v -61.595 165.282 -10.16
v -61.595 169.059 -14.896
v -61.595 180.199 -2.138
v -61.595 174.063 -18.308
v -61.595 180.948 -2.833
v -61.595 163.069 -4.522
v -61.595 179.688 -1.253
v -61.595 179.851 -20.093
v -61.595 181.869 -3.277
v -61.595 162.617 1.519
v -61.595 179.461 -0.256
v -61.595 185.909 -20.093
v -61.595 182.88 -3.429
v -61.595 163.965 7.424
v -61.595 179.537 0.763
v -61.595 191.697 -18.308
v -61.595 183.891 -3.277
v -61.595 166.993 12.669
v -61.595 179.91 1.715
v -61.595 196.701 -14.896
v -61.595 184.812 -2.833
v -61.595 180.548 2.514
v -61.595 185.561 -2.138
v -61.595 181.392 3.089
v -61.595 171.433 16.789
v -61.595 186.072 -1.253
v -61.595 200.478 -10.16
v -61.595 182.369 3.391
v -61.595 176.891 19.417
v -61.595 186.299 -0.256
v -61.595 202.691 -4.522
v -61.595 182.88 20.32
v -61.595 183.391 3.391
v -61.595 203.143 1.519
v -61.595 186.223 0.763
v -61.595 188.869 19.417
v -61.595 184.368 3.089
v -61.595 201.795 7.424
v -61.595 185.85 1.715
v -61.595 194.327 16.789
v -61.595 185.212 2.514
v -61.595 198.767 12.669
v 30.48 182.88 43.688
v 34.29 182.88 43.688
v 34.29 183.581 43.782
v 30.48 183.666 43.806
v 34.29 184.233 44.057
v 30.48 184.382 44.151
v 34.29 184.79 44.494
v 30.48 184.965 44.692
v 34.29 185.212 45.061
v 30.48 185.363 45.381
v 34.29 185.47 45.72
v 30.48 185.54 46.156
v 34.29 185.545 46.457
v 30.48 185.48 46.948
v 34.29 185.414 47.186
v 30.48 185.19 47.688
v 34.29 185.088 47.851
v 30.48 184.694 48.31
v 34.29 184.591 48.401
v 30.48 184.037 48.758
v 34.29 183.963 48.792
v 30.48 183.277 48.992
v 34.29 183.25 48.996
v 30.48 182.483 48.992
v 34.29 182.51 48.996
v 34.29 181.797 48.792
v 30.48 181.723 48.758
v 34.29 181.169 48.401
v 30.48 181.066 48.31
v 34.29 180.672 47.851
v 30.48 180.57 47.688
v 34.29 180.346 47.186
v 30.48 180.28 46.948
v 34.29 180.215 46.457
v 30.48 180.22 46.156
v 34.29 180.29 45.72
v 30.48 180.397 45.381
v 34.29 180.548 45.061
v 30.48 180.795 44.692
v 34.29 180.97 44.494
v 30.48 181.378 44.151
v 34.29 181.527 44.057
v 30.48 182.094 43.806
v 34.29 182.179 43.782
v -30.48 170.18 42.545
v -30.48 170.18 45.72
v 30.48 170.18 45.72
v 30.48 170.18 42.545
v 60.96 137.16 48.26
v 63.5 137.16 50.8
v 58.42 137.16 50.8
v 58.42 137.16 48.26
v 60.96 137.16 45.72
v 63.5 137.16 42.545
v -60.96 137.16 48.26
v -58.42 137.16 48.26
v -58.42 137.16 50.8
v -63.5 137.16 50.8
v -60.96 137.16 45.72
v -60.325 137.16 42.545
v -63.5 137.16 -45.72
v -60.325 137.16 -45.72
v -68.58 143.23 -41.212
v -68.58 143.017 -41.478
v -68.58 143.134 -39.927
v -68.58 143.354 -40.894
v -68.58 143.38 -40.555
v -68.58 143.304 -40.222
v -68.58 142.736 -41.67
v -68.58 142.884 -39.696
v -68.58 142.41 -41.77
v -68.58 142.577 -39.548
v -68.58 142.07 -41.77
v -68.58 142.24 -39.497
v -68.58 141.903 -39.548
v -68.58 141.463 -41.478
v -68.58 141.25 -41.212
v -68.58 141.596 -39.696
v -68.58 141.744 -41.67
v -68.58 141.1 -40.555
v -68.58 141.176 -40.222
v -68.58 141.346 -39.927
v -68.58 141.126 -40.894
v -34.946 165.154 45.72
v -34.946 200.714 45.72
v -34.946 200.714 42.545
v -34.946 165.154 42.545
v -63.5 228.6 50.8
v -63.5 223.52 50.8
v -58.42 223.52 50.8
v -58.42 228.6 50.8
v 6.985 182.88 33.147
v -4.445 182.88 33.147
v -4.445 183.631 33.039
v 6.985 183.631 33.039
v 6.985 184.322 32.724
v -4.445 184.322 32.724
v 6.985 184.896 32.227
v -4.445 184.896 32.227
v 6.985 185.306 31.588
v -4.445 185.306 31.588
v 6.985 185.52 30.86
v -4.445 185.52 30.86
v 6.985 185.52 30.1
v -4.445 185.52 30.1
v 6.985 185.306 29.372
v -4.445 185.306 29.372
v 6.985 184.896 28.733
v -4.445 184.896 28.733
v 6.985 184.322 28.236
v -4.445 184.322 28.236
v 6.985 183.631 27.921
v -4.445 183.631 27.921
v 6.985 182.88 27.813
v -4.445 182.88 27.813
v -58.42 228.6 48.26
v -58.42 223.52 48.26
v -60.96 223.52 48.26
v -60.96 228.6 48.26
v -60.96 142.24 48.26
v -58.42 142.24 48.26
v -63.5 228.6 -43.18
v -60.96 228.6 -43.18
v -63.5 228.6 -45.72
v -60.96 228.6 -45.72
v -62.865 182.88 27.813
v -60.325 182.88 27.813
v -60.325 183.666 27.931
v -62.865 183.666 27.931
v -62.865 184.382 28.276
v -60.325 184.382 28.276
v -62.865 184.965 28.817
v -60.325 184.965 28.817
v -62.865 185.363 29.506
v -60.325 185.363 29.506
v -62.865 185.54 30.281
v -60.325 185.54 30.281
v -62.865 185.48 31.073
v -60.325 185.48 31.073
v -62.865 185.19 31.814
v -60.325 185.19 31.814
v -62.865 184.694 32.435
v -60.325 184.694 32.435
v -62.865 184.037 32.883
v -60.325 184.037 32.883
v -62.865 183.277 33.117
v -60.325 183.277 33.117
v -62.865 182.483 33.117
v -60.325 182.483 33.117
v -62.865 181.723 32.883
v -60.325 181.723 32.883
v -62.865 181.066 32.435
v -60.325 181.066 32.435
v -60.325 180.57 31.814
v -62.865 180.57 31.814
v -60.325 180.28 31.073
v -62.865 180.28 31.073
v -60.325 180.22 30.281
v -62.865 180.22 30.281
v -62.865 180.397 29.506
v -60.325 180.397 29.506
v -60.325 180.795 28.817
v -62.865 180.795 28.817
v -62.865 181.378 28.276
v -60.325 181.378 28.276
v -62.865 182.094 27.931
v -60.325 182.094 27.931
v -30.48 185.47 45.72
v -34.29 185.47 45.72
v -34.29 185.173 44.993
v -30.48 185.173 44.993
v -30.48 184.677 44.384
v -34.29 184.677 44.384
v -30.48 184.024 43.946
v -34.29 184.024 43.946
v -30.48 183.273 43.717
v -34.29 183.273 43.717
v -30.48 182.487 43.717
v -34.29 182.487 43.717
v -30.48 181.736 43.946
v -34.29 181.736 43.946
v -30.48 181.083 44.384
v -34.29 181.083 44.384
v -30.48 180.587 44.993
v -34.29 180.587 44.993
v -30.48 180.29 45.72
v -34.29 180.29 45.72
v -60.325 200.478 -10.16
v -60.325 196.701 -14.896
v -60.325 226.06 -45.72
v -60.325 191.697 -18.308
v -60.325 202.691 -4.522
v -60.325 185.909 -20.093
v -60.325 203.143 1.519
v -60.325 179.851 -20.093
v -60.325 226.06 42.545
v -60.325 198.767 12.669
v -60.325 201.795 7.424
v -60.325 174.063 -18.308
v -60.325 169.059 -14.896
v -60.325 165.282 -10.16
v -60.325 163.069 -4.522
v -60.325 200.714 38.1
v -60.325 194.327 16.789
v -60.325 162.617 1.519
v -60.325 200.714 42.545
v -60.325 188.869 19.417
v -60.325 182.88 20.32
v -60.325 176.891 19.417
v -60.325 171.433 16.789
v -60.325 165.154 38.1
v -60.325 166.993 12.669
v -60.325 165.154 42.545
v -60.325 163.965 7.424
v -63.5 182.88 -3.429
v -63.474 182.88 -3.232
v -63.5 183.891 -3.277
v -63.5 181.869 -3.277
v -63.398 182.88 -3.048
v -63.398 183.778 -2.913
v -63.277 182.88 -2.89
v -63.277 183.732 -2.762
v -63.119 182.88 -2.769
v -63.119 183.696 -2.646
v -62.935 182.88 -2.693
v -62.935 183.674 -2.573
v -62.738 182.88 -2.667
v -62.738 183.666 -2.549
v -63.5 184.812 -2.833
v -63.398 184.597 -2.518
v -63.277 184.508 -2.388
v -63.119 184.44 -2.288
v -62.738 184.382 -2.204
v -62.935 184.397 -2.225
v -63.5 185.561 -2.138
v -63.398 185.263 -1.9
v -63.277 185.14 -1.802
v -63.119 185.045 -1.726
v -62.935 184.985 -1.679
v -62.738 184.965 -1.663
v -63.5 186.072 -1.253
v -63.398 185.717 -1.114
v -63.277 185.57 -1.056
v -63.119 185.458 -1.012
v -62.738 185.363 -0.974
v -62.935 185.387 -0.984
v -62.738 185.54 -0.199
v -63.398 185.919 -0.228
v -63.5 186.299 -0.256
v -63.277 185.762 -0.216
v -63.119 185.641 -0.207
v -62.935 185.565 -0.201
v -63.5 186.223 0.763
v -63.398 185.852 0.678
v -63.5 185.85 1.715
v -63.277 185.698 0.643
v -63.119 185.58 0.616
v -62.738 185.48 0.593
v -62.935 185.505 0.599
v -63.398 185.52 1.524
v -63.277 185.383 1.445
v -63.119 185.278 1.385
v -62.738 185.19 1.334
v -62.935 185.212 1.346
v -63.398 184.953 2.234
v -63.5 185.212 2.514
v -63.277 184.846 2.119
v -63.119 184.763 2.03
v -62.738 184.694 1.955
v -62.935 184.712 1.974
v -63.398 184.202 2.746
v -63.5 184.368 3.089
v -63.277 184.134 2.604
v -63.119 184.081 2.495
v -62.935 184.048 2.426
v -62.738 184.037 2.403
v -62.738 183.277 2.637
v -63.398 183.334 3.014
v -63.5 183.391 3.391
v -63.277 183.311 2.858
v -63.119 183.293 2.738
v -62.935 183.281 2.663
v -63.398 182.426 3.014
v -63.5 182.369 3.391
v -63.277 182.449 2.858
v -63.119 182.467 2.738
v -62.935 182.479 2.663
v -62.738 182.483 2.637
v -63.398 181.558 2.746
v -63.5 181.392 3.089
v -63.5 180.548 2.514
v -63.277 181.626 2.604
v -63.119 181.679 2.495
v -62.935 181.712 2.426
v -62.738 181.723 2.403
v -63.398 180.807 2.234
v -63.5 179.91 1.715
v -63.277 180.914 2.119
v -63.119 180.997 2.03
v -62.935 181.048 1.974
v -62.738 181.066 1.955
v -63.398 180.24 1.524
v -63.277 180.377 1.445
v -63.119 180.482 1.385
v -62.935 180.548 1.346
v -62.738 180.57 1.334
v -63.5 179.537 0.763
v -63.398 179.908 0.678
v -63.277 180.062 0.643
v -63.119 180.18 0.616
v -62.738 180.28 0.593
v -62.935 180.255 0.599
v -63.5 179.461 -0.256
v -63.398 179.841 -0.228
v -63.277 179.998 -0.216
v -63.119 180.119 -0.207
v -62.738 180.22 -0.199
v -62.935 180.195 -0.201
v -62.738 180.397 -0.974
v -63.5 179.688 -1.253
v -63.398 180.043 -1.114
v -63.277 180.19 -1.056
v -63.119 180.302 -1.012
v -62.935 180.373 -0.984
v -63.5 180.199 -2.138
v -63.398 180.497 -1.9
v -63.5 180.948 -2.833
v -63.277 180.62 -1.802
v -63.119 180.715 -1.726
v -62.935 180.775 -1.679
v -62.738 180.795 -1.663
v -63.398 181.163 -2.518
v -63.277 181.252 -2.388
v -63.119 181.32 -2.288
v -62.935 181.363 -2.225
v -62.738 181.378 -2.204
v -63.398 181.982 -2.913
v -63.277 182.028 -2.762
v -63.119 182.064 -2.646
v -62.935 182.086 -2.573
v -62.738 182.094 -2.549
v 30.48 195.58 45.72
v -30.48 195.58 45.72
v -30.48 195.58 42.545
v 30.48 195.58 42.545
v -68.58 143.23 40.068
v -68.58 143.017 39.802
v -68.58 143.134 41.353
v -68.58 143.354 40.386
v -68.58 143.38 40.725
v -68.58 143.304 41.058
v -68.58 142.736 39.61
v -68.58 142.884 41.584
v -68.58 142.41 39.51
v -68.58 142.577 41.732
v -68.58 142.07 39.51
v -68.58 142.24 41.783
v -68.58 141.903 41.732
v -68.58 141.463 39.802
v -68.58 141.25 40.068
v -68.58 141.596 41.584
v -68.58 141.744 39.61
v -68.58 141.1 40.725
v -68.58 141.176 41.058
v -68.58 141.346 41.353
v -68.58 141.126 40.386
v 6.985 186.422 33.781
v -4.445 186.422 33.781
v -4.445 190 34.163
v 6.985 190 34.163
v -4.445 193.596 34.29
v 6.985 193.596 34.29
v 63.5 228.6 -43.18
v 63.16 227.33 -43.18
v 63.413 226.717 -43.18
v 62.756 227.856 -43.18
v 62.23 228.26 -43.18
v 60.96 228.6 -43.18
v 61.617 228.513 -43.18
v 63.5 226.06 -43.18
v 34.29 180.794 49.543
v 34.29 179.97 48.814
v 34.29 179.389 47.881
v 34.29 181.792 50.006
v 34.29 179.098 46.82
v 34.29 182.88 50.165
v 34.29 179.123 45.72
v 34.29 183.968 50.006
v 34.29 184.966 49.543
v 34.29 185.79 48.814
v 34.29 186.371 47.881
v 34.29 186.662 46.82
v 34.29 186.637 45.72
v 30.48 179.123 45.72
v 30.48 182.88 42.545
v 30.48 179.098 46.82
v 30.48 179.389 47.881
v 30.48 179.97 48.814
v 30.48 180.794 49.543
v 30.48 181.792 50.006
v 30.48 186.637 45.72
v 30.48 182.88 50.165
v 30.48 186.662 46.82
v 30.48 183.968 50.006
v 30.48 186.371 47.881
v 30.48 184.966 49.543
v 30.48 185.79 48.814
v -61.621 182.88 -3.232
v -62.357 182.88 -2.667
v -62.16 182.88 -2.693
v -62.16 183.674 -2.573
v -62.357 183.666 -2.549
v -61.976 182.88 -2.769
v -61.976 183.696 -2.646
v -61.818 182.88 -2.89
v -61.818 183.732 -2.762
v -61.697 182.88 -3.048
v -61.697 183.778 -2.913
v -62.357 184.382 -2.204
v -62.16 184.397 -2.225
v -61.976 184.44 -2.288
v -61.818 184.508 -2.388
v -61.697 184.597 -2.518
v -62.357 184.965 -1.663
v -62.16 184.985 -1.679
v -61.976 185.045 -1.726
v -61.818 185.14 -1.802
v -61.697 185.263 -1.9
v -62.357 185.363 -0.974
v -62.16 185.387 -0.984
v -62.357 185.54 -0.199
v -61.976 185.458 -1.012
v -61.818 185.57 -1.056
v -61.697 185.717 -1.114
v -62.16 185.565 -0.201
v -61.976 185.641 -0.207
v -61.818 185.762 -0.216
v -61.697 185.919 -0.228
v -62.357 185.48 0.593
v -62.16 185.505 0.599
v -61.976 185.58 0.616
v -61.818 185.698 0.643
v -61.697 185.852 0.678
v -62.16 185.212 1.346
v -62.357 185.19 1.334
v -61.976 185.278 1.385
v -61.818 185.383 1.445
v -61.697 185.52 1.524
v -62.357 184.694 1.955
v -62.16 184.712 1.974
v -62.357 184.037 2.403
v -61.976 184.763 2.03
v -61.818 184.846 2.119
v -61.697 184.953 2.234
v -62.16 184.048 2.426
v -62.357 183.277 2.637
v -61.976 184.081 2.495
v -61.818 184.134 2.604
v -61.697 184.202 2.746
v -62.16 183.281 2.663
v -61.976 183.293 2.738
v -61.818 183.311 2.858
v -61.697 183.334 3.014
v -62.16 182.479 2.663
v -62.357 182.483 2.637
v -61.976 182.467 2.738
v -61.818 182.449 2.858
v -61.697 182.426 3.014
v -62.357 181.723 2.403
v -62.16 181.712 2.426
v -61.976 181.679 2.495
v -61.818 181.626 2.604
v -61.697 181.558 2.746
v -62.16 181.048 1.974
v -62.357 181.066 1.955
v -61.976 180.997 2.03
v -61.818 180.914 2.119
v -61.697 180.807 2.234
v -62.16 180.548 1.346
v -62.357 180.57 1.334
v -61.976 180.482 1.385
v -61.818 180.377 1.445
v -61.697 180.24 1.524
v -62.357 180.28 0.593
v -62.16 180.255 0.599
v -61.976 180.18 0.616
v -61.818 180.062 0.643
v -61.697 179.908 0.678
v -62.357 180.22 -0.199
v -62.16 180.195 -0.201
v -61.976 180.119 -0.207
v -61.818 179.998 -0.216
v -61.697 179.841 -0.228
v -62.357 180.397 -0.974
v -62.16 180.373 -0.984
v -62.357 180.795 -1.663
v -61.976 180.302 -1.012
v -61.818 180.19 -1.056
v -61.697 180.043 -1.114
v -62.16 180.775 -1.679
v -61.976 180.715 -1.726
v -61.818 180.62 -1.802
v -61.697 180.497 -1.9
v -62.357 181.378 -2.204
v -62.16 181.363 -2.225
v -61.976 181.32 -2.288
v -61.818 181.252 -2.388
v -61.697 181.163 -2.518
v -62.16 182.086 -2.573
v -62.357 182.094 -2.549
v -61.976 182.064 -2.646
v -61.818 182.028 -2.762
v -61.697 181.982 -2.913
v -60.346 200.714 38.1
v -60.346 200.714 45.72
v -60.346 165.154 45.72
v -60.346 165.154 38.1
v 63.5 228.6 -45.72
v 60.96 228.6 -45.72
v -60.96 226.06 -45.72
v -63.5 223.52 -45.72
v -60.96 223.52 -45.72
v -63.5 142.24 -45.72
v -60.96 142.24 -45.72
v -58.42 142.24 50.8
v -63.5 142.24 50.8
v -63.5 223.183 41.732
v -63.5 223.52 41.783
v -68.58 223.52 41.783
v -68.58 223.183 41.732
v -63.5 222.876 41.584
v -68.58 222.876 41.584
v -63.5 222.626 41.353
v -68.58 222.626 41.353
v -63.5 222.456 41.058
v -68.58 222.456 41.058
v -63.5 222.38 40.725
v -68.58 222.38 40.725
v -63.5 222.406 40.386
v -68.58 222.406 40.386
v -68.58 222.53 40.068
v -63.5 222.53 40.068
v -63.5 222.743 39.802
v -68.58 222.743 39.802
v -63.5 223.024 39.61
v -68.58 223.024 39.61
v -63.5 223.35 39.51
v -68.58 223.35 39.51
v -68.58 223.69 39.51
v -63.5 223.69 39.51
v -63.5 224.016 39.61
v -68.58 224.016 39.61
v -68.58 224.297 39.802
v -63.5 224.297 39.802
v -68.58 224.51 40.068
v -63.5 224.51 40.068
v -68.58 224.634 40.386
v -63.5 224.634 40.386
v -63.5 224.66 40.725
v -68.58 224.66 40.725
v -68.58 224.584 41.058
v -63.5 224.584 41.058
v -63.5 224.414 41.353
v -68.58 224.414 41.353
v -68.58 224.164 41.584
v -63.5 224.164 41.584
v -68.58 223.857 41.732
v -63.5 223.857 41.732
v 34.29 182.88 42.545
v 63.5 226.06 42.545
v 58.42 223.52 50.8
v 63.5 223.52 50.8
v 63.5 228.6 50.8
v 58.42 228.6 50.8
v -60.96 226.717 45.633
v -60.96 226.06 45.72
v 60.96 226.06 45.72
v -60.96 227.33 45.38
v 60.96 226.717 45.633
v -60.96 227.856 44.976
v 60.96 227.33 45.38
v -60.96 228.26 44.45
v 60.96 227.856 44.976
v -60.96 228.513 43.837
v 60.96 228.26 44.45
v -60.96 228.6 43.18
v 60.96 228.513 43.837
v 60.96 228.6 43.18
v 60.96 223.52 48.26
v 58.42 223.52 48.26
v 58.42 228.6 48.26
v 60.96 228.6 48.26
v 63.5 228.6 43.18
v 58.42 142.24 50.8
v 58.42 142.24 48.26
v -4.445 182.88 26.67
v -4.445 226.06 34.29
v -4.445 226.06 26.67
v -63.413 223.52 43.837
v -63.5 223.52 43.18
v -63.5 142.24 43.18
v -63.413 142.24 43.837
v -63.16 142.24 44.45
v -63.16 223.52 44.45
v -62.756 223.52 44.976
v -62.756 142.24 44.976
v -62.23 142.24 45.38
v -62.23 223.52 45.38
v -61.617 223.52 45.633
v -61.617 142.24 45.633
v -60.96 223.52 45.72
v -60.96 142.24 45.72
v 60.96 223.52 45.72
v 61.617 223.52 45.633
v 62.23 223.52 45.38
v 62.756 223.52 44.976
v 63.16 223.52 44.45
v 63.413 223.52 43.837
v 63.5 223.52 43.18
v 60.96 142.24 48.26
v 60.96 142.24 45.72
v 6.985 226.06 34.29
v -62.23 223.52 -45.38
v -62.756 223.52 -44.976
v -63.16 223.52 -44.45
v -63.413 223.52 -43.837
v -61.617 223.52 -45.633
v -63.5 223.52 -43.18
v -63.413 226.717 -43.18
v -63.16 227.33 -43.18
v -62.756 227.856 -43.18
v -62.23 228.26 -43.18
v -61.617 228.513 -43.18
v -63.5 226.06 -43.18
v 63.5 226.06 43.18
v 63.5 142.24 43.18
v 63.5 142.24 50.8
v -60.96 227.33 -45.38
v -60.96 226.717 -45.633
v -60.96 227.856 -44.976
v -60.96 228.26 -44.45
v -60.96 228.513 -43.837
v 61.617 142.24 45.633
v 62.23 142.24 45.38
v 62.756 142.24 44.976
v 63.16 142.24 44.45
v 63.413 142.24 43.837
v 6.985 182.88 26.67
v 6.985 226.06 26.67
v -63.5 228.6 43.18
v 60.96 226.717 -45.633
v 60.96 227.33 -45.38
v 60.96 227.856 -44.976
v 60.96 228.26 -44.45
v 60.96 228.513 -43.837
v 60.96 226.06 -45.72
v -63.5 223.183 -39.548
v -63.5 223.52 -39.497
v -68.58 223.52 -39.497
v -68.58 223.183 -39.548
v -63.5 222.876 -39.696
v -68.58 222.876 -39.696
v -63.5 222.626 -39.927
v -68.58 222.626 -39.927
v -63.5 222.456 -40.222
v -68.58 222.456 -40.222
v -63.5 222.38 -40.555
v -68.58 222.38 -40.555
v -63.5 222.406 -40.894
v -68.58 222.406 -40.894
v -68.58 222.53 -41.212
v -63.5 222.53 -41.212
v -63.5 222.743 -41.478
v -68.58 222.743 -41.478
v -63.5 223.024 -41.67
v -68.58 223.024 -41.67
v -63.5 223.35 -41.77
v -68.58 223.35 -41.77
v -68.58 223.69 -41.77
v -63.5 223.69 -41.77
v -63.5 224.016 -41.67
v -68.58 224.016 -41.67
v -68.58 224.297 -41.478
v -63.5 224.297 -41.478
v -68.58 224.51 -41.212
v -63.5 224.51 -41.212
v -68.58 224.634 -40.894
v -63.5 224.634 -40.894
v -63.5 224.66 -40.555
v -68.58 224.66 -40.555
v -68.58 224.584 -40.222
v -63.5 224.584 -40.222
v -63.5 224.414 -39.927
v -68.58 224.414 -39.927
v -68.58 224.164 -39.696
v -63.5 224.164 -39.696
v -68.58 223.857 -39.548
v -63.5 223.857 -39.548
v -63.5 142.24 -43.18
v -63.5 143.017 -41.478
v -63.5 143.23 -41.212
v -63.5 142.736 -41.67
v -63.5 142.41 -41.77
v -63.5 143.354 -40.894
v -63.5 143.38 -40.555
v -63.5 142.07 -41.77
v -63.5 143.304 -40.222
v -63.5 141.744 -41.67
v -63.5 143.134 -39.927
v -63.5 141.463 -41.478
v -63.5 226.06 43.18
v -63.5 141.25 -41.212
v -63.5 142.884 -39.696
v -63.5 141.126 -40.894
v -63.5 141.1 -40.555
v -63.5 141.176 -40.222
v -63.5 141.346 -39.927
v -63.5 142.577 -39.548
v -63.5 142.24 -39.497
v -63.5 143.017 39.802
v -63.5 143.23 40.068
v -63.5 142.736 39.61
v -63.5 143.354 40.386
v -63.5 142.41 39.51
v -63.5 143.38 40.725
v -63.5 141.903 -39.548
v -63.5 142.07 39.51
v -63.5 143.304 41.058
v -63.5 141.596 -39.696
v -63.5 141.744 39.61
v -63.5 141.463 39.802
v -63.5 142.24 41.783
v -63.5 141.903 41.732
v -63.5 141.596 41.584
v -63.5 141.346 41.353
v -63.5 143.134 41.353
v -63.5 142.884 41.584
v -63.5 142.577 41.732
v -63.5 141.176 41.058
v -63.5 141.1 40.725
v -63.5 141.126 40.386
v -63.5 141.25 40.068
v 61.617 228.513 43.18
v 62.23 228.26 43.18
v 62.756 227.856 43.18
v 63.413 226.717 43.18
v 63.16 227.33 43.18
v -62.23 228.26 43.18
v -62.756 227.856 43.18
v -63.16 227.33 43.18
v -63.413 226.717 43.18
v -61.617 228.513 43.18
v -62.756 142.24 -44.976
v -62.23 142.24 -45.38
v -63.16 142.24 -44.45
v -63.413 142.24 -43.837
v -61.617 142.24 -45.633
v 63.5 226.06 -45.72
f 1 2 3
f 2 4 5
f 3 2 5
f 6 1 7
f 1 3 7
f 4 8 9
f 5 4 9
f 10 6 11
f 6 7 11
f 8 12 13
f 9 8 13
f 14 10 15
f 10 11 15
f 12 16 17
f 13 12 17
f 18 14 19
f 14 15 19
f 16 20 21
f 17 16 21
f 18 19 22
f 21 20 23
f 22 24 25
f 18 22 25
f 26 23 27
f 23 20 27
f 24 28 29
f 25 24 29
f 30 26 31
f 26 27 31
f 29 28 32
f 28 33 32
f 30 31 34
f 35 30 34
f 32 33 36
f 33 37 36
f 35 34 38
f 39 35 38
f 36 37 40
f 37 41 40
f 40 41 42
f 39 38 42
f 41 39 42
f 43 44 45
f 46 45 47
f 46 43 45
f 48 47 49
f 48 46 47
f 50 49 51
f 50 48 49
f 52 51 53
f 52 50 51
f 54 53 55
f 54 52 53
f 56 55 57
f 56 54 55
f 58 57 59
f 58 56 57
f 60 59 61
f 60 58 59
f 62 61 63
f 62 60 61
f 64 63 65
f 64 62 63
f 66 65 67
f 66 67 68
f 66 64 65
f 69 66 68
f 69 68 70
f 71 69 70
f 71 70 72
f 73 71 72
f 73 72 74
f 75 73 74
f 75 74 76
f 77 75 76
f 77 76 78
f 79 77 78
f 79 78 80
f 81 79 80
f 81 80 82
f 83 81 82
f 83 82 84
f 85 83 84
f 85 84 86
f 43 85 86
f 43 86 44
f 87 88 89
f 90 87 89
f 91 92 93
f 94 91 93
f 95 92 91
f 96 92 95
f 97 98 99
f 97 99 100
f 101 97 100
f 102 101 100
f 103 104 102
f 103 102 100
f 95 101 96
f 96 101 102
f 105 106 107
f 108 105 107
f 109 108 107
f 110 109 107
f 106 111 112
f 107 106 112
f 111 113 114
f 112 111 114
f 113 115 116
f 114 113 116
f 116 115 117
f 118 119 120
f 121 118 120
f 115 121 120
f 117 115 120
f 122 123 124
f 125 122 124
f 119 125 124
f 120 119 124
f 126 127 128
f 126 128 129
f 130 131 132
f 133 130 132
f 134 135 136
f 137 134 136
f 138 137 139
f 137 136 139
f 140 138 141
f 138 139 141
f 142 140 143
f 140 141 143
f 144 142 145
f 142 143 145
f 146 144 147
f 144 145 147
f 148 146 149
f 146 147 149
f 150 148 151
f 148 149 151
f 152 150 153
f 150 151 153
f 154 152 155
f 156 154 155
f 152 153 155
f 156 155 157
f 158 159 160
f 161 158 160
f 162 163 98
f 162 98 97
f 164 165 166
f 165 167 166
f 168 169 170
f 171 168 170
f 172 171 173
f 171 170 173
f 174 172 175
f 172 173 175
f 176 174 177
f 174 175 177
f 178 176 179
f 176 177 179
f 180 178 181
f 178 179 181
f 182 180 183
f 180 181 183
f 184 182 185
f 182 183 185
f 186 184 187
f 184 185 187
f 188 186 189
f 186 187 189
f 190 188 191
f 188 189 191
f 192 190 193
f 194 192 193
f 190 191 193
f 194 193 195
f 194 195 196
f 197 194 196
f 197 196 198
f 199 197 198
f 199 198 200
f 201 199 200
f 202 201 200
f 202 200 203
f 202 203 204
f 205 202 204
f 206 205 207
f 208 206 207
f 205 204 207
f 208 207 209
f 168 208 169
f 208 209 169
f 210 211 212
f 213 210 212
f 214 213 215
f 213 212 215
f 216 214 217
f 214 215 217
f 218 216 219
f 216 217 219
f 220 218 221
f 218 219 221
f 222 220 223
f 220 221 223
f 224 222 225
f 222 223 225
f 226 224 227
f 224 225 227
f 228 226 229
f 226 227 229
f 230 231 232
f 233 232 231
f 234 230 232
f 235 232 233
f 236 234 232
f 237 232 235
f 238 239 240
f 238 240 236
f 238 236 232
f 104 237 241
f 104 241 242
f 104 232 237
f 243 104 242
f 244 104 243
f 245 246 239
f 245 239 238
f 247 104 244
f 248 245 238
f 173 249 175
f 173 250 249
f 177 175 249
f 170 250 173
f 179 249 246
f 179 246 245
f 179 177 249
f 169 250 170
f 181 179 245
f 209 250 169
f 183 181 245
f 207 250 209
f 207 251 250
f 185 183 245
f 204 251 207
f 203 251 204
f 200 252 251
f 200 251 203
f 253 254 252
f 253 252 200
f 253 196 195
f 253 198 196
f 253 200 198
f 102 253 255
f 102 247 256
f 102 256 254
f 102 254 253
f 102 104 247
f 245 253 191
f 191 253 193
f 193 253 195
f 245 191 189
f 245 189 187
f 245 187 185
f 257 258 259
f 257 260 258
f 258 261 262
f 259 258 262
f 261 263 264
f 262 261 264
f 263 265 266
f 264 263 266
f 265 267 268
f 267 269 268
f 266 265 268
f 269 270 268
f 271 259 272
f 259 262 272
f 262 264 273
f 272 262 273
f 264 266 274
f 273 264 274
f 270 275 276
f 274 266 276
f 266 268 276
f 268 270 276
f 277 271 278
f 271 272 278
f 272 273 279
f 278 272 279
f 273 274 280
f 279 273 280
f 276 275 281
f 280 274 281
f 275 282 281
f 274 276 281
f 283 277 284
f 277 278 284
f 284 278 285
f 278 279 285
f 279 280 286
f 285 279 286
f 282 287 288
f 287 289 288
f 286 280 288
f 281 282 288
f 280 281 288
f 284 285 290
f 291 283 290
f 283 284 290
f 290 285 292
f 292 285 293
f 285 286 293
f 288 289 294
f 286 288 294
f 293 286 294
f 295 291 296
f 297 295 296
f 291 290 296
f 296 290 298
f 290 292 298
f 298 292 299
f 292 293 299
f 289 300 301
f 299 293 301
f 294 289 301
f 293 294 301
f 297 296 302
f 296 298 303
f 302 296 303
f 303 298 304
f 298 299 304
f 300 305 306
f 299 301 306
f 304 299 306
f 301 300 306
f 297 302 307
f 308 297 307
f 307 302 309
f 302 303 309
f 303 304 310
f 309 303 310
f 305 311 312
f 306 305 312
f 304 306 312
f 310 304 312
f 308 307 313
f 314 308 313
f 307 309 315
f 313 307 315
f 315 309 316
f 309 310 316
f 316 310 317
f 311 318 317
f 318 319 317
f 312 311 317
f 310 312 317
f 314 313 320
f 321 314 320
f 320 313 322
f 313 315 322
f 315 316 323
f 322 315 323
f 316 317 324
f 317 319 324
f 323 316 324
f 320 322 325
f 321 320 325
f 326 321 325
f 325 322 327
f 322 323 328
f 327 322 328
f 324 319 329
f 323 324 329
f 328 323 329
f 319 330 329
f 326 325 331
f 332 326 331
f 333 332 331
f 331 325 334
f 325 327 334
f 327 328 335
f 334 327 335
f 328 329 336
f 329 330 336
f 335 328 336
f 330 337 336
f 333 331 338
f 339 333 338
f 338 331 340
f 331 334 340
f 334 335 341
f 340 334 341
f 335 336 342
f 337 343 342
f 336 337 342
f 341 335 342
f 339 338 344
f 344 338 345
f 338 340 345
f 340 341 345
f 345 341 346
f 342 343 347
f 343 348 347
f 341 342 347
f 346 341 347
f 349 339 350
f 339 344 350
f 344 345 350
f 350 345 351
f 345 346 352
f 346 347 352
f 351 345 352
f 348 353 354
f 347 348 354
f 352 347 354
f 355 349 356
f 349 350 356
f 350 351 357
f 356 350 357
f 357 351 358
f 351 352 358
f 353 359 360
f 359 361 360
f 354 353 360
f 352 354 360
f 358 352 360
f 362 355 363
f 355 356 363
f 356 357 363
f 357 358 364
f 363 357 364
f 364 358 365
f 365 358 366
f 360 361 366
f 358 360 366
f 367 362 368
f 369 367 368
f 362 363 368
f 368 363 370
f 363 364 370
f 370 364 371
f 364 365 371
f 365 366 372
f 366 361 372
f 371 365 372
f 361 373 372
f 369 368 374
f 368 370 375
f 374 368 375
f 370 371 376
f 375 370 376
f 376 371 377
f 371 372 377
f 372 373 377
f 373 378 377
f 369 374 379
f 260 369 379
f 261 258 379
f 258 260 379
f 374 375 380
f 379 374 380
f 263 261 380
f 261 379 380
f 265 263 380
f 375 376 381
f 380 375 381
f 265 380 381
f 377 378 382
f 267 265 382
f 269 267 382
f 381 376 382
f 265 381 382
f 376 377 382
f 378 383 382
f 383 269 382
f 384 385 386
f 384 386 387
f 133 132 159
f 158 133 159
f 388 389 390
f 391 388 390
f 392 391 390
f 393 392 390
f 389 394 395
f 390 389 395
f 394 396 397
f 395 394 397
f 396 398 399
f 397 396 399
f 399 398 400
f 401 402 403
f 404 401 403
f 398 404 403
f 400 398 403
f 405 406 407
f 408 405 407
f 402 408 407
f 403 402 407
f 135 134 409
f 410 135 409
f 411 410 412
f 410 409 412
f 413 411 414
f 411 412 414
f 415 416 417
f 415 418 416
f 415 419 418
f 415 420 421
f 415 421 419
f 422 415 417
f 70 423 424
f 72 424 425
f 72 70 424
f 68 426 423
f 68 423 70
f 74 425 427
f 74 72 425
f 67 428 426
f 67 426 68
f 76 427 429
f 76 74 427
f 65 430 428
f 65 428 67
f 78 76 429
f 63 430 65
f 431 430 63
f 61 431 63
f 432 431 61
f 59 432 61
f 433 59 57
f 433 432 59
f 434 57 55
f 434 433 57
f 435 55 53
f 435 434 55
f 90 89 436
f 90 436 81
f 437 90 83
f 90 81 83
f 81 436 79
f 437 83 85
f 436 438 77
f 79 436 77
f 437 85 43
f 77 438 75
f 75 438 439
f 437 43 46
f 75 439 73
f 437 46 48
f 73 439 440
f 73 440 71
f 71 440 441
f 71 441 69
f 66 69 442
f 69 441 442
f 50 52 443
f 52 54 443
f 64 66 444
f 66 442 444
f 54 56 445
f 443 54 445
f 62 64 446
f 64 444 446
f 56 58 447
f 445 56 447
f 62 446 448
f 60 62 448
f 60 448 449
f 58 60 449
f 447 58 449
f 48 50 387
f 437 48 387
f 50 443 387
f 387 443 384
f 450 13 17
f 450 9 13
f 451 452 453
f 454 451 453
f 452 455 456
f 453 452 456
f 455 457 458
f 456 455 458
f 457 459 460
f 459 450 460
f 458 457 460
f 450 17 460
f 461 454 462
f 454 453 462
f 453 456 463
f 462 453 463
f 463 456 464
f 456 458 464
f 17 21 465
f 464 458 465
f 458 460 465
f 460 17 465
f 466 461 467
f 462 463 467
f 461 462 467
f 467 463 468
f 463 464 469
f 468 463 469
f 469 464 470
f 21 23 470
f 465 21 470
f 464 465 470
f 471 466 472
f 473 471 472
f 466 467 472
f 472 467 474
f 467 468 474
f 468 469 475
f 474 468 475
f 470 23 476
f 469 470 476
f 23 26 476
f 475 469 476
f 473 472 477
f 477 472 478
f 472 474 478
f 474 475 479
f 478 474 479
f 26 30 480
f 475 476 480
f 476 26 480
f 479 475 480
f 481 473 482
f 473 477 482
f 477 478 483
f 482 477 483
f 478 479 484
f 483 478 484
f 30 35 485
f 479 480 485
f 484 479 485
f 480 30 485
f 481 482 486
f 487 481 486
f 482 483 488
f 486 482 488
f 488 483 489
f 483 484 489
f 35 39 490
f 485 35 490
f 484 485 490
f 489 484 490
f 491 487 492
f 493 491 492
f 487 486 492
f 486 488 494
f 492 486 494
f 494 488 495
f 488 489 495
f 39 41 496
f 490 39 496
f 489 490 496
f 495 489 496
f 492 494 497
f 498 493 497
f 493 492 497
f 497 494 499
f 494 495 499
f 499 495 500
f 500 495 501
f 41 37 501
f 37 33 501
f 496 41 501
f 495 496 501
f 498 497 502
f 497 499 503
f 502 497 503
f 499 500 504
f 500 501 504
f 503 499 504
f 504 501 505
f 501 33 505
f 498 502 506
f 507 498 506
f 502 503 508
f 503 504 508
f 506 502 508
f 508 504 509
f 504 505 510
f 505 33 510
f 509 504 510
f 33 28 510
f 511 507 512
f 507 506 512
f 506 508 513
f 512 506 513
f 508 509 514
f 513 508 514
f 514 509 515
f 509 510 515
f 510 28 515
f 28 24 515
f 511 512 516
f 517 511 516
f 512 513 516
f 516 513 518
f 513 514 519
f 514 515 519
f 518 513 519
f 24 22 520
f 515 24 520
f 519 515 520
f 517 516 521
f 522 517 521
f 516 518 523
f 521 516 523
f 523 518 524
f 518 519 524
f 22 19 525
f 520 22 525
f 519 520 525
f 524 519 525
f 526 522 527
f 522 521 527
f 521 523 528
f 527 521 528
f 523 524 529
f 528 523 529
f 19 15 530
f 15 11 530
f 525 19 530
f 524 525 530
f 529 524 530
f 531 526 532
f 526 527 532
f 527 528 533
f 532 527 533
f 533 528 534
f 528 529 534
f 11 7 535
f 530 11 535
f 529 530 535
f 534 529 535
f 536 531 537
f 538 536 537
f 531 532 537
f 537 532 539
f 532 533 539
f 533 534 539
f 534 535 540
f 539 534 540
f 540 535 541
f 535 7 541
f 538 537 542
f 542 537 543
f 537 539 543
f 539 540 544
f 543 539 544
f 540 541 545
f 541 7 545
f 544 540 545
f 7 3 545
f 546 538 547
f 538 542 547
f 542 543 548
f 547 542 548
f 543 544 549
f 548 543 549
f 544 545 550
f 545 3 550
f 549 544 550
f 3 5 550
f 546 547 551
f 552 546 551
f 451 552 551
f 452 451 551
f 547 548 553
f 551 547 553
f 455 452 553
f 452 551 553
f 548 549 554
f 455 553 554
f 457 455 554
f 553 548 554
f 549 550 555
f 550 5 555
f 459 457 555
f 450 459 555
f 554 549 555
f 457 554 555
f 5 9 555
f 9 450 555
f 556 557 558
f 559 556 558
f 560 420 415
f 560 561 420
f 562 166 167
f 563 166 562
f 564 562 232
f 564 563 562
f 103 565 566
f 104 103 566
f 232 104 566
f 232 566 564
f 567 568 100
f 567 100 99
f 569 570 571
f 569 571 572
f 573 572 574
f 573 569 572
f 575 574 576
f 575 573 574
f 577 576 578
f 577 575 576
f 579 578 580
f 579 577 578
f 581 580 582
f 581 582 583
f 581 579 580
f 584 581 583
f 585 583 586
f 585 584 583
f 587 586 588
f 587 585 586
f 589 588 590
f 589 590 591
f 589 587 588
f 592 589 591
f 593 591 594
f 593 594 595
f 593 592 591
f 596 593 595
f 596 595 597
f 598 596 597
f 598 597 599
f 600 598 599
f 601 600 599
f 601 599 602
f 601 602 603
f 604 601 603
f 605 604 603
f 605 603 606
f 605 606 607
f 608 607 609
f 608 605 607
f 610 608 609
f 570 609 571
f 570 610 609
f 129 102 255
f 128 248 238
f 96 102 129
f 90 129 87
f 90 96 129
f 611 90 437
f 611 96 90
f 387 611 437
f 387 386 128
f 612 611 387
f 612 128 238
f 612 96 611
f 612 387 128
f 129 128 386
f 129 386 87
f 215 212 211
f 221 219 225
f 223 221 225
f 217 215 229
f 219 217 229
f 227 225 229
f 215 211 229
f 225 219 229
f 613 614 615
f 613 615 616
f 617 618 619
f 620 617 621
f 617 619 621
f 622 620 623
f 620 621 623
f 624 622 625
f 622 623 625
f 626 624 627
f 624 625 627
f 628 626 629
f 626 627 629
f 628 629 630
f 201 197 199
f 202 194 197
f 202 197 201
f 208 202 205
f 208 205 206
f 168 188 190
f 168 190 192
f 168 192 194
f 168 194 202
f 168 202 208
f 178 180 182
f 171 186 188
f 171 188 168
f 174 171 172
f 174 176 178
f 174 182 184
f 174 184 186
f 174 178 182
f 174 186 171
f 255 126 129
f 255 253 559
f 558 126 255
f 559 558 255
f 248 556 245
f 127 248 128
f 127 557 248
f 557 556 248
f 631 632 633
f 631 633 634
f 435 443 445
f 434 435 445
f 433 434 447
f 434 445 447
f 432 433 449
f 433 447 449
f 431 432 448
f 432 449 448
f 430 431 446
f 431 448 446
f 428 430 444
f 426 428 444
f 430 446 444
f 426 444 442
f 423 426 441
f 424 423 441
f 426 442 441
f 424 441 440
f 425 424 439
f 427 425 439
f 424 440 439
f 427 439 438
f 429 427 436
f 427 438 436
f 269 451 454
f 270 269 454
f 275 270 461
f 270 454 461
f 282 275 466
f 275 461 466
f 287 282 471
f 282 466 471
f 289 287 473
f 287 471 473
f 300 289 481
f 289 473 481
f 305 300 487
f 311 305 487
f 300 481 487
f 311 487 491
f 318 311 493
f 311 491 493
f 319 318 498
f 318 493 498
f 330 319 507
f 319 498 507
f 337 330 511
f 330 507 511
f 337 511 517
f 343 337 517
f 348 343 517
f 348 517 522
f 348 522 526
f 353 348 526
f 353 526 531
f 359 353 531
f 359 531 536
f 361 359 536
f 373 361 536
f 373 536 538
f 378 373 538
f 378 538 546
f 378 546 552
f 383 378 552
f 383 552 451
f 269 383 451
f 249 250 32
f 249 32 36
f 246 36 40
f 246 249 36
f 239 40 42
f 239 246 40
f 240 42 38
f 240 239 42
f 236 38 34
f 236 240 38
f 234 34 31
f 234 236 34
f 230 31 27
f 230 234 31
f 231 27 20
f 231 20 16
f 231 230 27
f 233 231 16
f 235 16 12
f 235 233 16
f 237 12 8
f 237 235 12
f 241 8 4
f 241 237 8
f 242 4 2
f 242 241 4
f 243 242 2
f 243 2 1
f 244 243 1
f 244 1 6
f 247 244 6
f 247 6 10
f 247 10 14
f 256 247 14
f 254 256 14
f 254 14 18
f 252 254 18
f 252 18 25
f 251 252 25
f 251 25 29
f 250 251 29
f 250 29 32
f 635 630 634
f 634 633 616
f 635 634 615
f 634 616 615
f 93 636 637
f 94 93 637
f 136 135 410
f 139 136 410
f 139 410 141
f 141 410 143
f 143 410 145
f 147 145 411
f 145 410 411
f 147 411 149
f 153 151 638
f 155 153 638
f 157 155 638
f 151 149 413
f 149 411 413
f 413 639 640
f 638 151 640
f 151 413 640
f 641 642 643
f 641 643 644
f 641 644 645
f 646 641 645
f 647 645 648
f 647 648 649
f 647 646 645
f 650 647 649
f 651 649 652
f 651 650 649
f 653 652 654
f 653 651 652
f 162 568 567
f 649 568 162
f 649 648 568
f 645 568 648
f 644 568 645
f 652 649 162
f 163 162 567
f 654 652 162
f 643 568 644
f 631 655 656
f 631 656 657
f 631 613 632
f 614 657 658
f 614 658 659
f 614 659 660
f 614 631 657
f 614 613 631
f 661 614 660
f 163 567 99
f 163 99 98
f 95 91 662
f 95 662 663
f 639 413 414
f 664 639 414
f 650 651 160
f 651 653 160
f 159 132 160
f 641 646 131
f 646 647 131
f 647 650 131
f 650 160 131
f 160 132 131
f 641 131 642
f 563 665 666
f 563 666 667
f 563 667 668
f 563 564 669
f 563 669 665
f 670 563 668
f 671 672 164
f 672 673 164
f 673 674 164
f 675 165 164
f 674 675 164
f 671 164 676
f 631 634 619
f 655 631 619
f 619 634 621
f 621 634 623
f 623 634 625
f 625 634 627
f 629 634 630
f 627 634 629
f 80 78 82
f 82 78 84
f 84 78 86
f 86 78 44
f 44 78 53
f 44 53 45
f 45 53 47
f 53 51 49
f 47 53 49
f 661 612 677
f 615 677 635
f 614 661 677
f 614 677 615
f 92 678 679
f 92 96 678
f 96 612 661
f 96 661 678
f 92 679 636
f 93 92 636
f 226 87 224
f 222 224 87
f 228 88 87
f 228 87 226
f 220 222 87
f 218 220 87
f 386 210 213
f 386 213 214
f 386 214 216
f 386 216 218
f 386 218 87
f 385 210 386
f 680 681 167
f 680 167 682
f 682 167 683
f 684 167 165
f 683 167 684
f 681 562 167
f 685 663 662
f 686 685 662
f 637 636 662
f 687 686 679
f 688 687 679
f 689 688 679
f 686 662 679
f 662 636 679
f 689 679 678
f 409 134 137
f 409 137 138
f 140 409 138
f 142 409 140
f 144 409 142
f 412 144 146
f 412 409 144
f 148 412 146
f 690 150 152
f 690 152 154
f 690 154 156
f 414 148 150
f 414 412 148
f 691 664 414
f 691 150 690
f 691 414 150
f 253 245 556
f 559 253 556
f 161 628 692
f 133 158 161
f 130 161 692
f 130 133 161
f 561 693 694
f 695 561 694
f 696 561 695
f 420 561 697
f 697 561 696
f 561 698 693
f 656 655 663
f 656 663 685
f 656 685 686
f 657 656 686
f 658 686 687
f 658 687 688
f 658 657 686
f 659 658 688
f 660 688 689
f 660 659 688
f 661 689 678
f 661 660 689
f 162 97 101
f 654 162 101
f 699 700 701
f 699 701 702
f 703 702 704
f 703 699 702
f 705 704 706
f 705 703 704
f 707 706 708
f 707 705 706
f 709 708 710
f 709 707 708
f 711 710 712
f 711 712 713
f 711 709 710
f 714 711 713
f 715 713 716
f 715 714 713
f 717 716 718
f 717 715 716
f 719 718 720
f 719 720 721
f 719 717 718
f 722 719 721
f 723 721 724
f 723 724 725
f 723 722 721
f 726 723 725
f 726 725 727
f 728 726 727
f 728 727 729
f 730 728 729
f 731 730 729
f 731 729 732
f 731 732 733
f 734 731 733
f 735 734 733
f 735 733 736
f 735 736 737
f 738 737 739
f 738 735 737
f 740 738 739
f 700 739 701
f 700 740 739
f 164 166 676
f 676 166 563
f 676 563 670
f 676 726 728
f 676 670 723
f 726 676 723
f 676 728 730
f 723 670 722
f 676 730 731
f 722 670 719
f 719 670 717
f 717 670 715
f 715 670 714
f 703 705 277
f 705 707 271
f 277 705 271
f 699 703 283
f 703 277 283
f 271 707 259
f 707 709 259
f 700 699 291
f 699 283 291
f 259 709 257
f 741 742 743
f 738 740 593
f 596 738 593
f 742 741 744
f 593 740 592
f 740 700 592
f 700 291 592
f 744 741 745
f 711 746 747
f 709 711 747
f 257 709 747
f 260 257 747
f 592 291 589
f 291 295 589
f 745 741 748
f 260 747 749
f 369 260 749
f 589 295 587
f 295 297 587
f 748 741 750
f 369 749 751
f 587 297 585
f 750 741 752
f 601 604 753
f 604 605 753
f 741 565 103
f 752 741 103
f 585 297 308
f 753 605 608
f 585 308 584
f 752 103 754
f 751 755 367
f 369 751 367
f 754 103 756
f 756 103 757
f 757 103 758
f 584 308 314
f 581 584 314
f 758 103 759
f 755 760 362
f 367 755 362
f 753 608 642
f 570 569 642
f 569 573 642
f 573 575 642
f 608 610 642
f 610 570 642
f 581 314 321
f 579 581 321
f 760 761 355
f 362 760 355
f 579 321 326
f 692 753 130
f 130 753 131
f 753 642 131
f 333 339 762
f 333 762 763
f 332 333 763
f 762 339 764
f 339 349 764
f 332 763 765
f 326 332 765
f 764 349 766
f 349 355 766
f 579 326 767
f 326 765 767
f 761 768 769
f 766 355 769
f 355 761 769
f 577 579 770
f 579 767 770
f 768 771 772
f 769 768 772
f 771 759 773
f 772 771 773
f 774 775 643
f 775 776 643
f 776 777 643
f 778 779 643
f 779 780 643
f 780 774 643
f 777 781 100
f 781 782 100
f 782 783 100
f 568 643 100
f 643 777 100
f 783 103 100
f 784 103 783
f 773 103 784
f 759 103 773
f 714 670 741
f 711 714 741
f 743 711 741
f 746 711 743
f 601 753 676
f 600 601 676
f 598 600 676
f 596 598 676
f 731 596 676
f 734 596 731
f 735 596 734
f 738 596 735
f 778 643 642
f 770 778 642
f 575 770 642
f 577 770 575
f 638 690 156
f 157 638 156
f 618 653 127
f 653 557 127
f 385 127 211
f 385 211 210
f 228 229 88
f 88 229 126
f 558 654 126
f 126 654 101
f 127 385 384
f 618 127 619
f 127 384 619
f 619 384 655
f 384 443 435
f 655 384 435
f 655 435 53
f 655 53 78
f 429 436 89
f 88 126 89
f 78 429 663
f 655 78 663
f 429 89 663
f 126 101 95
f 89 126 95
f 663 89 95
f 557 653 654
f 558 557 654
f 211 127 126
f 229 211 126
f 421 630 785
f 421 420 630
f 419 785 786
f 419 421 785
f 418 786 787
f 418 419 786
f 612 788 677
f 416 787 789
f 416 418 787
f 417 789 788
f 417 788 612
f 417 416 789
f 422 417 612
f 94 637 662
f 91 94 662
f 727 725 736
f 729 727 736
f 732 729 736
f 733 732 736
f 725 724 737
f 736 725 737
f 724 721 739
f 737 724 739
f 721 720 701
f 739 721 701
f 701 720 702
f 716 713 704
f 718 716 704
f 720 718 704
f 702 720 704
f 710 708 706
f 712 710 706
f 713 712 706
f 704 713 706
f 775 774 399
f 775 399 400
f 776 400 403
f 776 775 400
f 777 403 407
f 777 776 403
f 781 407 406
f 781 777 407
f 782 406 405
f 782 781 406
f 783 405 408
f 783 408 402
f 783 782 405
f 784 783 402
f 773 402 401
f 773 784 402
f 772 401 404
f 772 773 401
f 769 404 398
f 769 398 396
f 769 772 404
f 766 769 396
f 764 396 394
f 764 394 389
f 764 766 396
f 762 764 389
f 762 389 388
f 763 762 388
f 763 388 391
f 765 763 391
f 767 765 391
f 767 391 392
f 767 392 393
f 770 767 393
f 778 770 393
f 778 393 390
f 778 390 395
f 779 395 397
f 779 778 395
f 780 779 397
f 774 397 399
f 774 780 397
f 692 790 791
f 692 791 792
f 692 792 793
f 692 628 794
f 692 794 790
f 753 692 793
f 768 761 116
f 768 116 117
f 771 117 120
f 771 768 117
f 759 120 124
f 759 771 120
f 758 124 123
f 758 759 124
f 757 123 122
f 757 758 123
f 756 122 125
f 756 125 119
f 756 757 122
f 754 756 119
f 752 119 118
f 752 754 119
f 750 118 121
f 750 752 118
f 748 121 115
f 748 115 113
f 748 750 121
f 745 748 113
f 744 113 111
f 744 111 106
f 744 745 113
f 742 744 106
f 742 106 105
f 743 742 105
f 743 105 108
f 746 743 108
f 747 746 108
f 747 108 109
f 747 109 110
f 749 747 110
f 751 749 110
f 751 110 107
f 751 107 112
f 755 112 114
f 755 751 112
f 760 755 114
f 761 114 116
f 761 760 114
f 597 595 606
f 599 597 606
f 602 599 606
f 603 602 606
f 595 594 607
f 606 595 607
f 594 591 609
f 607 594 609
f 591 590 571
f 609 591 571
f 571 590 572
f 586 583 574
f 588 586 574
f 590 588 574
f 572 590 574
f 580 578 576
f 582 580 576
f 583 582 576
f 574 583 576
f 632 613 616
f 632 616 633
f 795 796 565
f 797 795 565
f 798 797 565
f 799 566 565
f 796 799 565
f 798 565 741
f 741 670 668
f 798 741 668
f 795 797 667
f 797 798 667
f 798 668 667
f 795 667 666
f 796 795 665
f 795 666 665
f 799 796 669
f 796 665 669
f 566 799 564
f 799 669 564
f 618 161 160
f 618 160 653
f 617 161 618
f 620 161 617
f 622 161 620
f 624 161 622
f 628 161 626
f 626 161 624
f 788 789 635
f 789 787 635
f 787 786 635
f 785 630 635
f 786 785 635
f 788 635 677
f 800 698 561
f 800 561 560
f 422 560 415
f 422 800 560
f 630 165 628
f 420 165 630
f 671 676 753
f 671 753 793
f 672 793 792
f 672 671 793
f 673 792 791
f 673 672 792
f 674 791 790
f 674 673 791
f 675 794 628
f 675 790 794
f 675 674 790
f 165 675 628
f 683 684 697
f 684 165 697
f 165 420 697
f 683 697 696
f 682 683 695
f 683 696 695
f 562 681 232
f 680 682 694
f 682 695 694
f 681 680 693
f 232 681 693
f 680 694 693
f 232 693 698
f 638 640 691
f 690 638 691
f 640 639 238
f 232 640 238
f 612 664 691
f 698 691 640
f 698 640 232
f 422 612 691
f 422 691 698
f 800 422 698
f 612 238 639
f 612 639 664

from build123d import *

# Parameters (mm, degrees)
SKETCH1_W            = 127
SKETCH1_H            = 91.44
BOSS_EXTRUDE1_DEPTH  = 228.6
SKETCH3_W            = 120.65
SKETCH3_H            = 85.09
CUT_EXTRUDE1_DEPTH   = 226.06
SKETCH2_R            = 2.667
CUT_EXTRUDE2_DEPTH   = 266.475570251
SKETCH4_R            = 1.143
BOSS_EXTRUDE3_DEPTH  = 5.08
SKETCH5_R            = 20.32
CUT_EXTRUDE3_DEPTH   = 1.27
FILLET1_R            = 0.762
FILLET2_R            = 0.762
FILLET3_R            = 0.762
SKETCH6_W            = 60.96
SKETCH6_H            = 25.4
CUT_EXTRUDE4_DEPTH   = 256.582569828
FILLET4_R            = 2.54
SKETCH7_W            = 85.09
SKETCH7_H            = 111.152565629
CUT_EXTRUDE5_DEPTH   = 268.942913323
SKETCH10_R           = 2.667
CUT_EXTRUDE6_DEPTH   = 2.54
CUT_EXTRUDE7_DEPTH   = 7.62
SKETCH13_R           = 2.667
CUT_EXTRUDE8_DEPTH   = 2.54
CUT_EXTRUDE9_DEPTH   = 7.62
SKETCH20_W           = 11.43
SKETCH20_H           = 7.62
BOSS_EXTRUDE4_DEPTH  = 50.8
CUT_EXTRUDE10_START  = -12.7
SKETCH21_R           = 2.667
CUT_EXTRUDE10_DEPTH  = 12.7
CUT_EXTRUDE11_DEPTH  = 12.7
SKETCH24_R           = 3.81
BOSS_EXTRUDE5_DEPTH  = 3.81
SKETCH25_R           = 2.667
CUT_EXTRUDE12_DEPTH  = 3.81
CUT_EXTRUDE13_DEPTH  = 12.7
CUT_EXTRUDE14_START  = 64.77
SKETCH27_R           = 2.667
CUT_EXTRUDE14_DEPTH  = 64.77
CUT_EXTRUDE15_START  = 64.77
SKETCH29_R           = 2.667
CUT_EXTRUDE15_DEPTH  = 64.77
FILLET6_R            = 50.8
FILLET7_R            = 50.8
BOSS_EXTRUDE6_DEPTH  = 5.08
MIRROR5_COPY_1_DEPTH = 5.08
MIRROR6_COPY_1_DEPTH = 5.08
MIRROR6_COPY_2_DEPTH = 5.08
MIRROR6_COPY_3_DEPTH = 5.08
SKETCH35_W           = 127
SKETCH35_H           = 137.16
CUT_EXTRUDE16_DEPTH  = 52.07
SKETCH39_W           = 85.09
SKETCH39_H           = 88.9
CUT_EXTRUDE20_DEPTH  = 52.07
SKETCH41_W           = 123.825
SKETCH41_H           = 88.9
CUT_EXTRUDE21_DEPTH  = 52.07
SKETCH42_W           = 127
SKETCH42_H           = 5.08
CUT_EXTRUDE22_DEPTH  = 236.22


with BuildPart() as part:
    # Sketch1 → Boss-Extrude1 (new body)
    with BuildSketch(Plane(origin=(0, 0, 0), x_dir=(1, 0, 0), z_dir=(0, 1, 0))):
        Rectangle(SKETCH1_W, SKETCH1_H)
    extrude(amount=BOSS_EXTRUDE1_DEPTH)

    # Sketch3 → Cut-Extrude1 (cut)
    with BuildSketch(Plane.XZ):
        Rectangle(SKETCH3_W, SKETCH3_H)
    extrude(amount=-CUT_EXTRUDE1_DEPTH, mode=Mode.SUBTRACT)

    # Sketch2 → Cut-Extrude2 (cut, through all)
    with BuildSketch(Plane(origin=(63.5, 0, 0), x_dir=(0, 0, -1), z_dir=(1, 0, 0))):
        with Locations((0, 182.88)):
            Circle(SKETCH2_R)
    extrude(amount=-CUT_EXTRUDE2_DEPTH, mode=Mode.SUBTRACT)

    # Sketch4 → Boss-Extrude3 (add)
    with BuildSketch(Plane(origin=(63.5, 0, 0), x_dir=(0, 0, -1), z_dir=(1, 0, 0))):
        with Locations(Location((-40.64, 223.52, 0), (0, 0, 180))):
            Circle(SKETCH4_R)
        with Locations(Location((40.64, 223.52, 0), (0, 0, 180))):
            Circle(SKETCH4_R)
        with Locations(Location((40.64, 142.24, 0), (0, 0, 180))):
            Circle(SKETCH4_R)
        with Locations(Location((-40.64, 142.24, 0), (0, 0, 180))):
            Circle(SKETCH4_R)
    boss_extrude3 = extrude(amount=BOSS_EXTRUDE3_DEPTH)

    # Sketch5 → Cut-Extrude3 (cut)
    with BuildSketch(Plane.ZY.offset(-60.325)):
        with Locations((0, 182.88)):
            Circle(SKETCH5_R)
    cut_extrude3 = extrude(amount=-CUT_EXTRUDE3_DEPTH, mode=Mode.SUBTRACT)

    # Fillet1
    fillet1_edges = [part.edges().sort_by_distance(p)[0] for p in [
        (61.595, 182.88, 2.667),
    ]]
    fillet(fillet1_edges, radius=FILLET1_R)

    # Fillet2
    fillet2_edges = [part.edges().sort_by_distance(p)[0] for p in [
        (63.5, 182.88, 2.667),
    ]]
    fillet(fillet2_edges, radius=FILLET2_R)

    # Mirror2: Boss-Extrude3, Cut-Extrude3 across plane
    add(boss_extrude3.mirror(Plane(origin=(0, 0, 0), x_dir=(0, 0, 1), z_dir=(1, 0, 0))))
    add(cut_extrude3.mirror(Plane(origin=(0, 0, 0), x_dir=(0, 0, 1), z_dir=(1, 0, 0))), mode=Mode.SUBTRACT)

    # Fillet3
    fillet3_edges = [part.edges().sort_by_distance(p)[0] for p in [
        (-63.5, 182.88, 2.667),
        (-61.595, 182.88, 2.667),
    ]]
    fillet(fillet3_edges, radius=FILLET3_R)

    # Sketch6 → Cut-Extrude4 (cut, through all)
    with BuildSketch(Plane.XY.offset(45.72)):
        with Locations((0, 182.88)):
            Rectangle(SKETCH6_W, SKETCH6_H)
    extrude(amount=-CUT_EXTRUDE4_DEPTH, mode=Mode.SUBTRACT)

    # Fillet4
    fillet4_edges = [part.edges().sort_by_distance(p)[0] for p in [
        (-63.5, 228.6, 0),
        (0, 228.6, 45.72),
        (63.5, 228.6, 0),
        (63.5, 114.3, 45.72),
        (-63.5, 114.3, 45.72),
        (-63.5, 114.3, -45.72),
        (63.5, 114.3, -45.72),
        (0, 228.6, -45.72),
    ]]
    fillet(fillet4_edges, radius=FILLET4_R)

    # Sketch7 → Cut-Extrude5 (cut, through all)
    with BuildSketch(Plane(origin=(63.5, 0, 0), x_dir=(0, 0, -1), z_dir=(1, 0, 0))):
        with Locations((0, 75.896282814)):
            Rectangle(SKETCH7_W, SKETCH7_H)
    extrude(amount=-CUT_EXTRUDE5_DEPTH, mode=Mode.SUBTRACT)

    # Sketch10 → Cut-Extrude6 (cut)
    with BuildSketch(Plane.ZY.offset(-60.325)):
        with Locations((-30.48, 182.88)):
            Circle(SKETCH10_R)
    extrude(amount=-CUT_EXTRUDE6_DEPTH, mode=Mode.SUBTRACT)

    # Sketch12 → Cut-Extrude7 (cut)
    with BuildSketch(Plane(origin=(0, 0, -45.72), x_dir=(-1, 0, 0), z_dir=(0, 0, -1))):
        Polygon((-34.810362372, 182.807903476), (-34.810362372, 200.587903476), (-60.210362372, 200.587903476), (-60.210362372, 182.807903476), (-60.210362372, 165.027903476), (-34.810362372, 165.027903476), align=None)
    extrude(amount=-CUT_EXTRUDE7_DEPTH, mode=Mode.SUBTRACT)

    # Sketch13 → Cut-Extrude8 (cut)
    with BuildSketch(Plane(origin=(-60.325, 0, 0), x_dir=(0, 0, -1), z_dir=(1, 0, 0))):
        with Locations((-30.48, 182.88)):
            Circle(SKETCH13_R)
    extrude(amount=-CUT_EXTRUDE8_DEPTH, mode=Mode.SUBTRACT)

    # Sketch16 → Cut-Extrude9 (cut)
    with BuildSketch(Plane.XY.offset(45.72)):
        Polygon((-60.34639287, 182.934228321), (-60.34639287, 200.714228321), (-34.94639287, 200.714228321), (-34.94639287, 165.154228321), (-60.34639287, 165.154228321), align=None)
    extrude(amount=-CUT_EXTRUDE9_DEPTH, mode=Mode.SUBTRACT)

    # Sketch20 → Boss-Extrude4 (add)
    with BuildSketch(Plane.XZ.offset(-226.06)):
        with Locations((1.27, -30.48)):
            Rectangle(SKETCH20_W, SKETCH20_H)
    boss_extrude4 = extrude(amount=BOSS_EXTRUDE4_DEPTH)

    # Sketch21 → Cut-Extrude10 (cut)
    with BuildSketch(Plane(origin=(6.985, 0, 0), x_dir=(0, 0, -1), z_dir=(1, 0, 0)).offset(CUT_EXTRUDE10_START)):
        with Locations(Location((30.48, 182.88, 0), (0, 0, 180))):
            Circle(SKETCH21_R)
    cut_extrude10 = extrude(amount=CUT_EXTRUDE10_DEPTH, mode=Mode.SUBTRACT)

    # Sketch23 → Cut-Extrude11 (cut)
    with BuildSketch(Plane(origin=(6.985, 0, 0), x_dir=(0, 0, -1), z_dir=(1, 0, 0))):
        Polygon((27.813, 182.88), (26.67, 182.88), (26.67, 175.26), (34.29, 175.26), (34.29, 182.88), align=None)
    extrude(amount=-CUT_EXTRUDE11_DEPTH, mode=Mode.SUBTRACT)

    # Sketch24 → Boss-Extrude5 (add)
    with BuildSketch(Plane.ZY.offset(-30.48)):
        with Locations((-46.355, 182.88)):
            Circle(SKETCH24_R)
    boss_extrude5 = extrude(amount=-BOSS_EXTRUDE5_DEPTH)

    # Sketch25 → Cut-Extrude12 (cut)
    with BuildSketch(Plane.ZY.offset(-30.48)):
        with Locations((-46.355, 182.88)):
            Circle(SKETCH25_R)
    cut_extrude12 = extrude(amount=-CUT_EXTRUDE12_DEPTH, mode=Mode.SUBTRACT)

    # Mirror3: Boss-Extrude4, Cut-Extrude10, Boss-Extrude5, Cut-Extrude12 across plane
    add(boss_extrude4.mirror(Plane.XY))
    add(cut_extrude10.mirror(Plane.XY), mode=Mode.SUBTRACT)
    add(boss_extrude5.mirror(Plane.XY))
    add(cut_extrude12.mirror(Plane.XY), mode=Mode.SUBTRACT)

    # Sketch26 → Cut-Extrude13 (cut)
    with BuildSketch(Plane(origin=(6.985, 0, 0), x_dir=(0, 0, -1), z_dir=(1, 0, 0))):
        Polygon((-27.813, 182.88), (-26.67, 182.88), (-26.67, 175.26), (-34.29, 175.26), (-34.29, 182.88), align=None)
    extrude(amount=-CUT_EXTRUDE13_DEPTH, mode=Mode.SUBTRACT)

    # Sketch27 → Cut-Extrude14 (cut)
    with BuildSketch(Plane.ZY.offset(-30.48).offset(CUT_EXTRUDE14_START)):
        with Locations((-46.355, 182.88)):
            Circle(SKETCH27_R)
    extrude(amount=-CUT_EXTRUDE14_DEPTH, mode=Mode.SUBTRACT)

    # Sketch29 → Cut-Extrude15 (cut)
    with BuildSketch(Plane.ZY.offset(-30.48).offset(CUT_EXTRUDE15_START)):
        with Locations(Location((46.355, 182.88, 0), (0, 0, 256.225853002))):
            Circle(SKETCH29_R)
    extrude(amount=-CUT_EXTRUDE15_DEPTH, mode=Mode.SUBTRACT)

    # Fillet6
    # the kernel refuses this fillet: 50.8 mm, written as the material it takes off along each edge
    with BuildSketch(Plane(origin=(33.773797915, 182.88, 34.29), x_dir=(0, 0, -1), z_dir=(-1, 0, 0))) as fillet6_piece_1:
        with BuildLine():
            CenterArc((50.8, -10.715519166), FILLET6_R, 167.822824326, 12.177175674)
            Line((0, -10.715519166), (-1.016, -10.715519166))
            Line((-1.016, -10.715519166), (-1.016, 0))
            Line((-1.016, 0), (0, 1.016))
            ThreePointArc((0, 1.016), (0.5715, 1.016), (0.14986, 0.214310383))
            Line((0.14986, 0.214310383), (1.143, 0))
        make_face()
    extrude(amount=65.007595831, mode=Mode.SUBTRACT)

    # Fillet7
    # the kernel refuses this fillet: 50.8 mm, written as the material it takes off along each edge
    with BuildSketch(Plane(origin=(33.773797915, 182.88, -34.29), x_dir=(0, 1, 0), z_dir=(-1, 0, 0))) as fillet7_piece_1:
        with BuildLine():
            CenterArc((10.715519166, -50.8), FILLET7_R, 90, 12.177175674)
            Line((0, -1.143), (0, 0))
            Line((0, 0), (10.715519166, 0))
        make_face()
    extrude(amount=65.007595831, mode=Mode.SUBTRACT)

    # Sketch33 → Boss-Extrude6 (add)
    with BuildSketch(Plane(origin=(0, 228.6, 0), x_dir=(1, 0, 0), z_dir=(0, 1, 0))):
        Polygon((63.5, 43.18), (63.5, 50.8), (58.42, 50.8), (58.42, 48.26), (60.96, 48.26), (60.96, 43.18), align=None)
    boss_extrude6 = extrude(amount=-BOSS_EXTRUDE6_DEPTH)

    # Mirror4: Boss-Extrude6 across plane
    add(boss_extrude6.mirror(Plane(origin=(0, 0, 0), x_dir=(0, 0, 1), z_dir=(1, 0, 0))))

    # Mirror5: Boss-Extrude6 across plane
    add(boss_extrude6.mirror(Plane.ZX.offset(182.88)))

    # Mirror5 copy 1 sketch → Mirror5 copy 1 (add)
    with BuildSketch(Plane(origin=(0, 137.16, 0), x_dir=(-1, 0, 0), z_dir=(0, -1, 0))):
        Polygon((63.5, 43.18), (63.5, 50.8), (58.42, 50.8), (58.42, 48.26), (60.96, 48.26), (60.96, 43.18), align=None)
    extrude(amount=-MIRROR5_COPY_1_DEPTH)

    # Mirror6: Boss-Extrude6 across plane
    add(boss_extrude6.mirror(Plane.XY))

    # Mirror6 copy 1 sketch → Mirror6 copy 1 (add)
    with BuildSketch(Plane(origin=(0, 228.6, 0), x_dir=(-1, 0, 0), z_dir=(0, 1, 0))):
        Polygon((63.5, 43.18), (63.5, 50.8), (58.42, 50.8), (58.42, 48.26), (60.96, 48.26), (60.96, 43.18), align=None)
    extrude(amount=-MIRROR6_COPY_1_DEPTH)

    # Mirror6 copy 2 sketch → Mirror6 copy 2 (add)
    with BuildSketch(Plane.XZ.offset(-137.16)):
        Polygon((63.5, 43.18), (63.5, 50.8), (58.42, 50.8), (58.42, 48.26), (60.96, 48.26), (60.96, 43.18), align=None)
    extrude(amount=-MIRROR6_COPY_2_DEPTH)

    # Mirror6 copy 3 sketch → Mirror6 copy 3 (add)
    with BuildSketch(Plane(origin=(0, 137.16, 0), x_dir=(-1, 0, 0), z_dir=(0, -1, 0))):
        Polygon((63.5, -43.18), (63.5, -50.8), (58.42, -50.8), (58.42, -48.26), (60.96, -48.26), (60.96, -43.18), align=None)
    extrude(amount=-MIRROR6_COPY_3_DEPTH)

    # Sketch35 → Cut-Extrude16 (cut, symmetric)
    with BuildSketch(Plane.XY):
        with Locations((0, 68.58)):
            Rectangle(SKETCH35_W, SKETCH35_H)
    extrude(amount=CUT_EXTRUDE16_DEPTH, both=True, mode=Mode.SUBTRACT)

    # Sketch39 → Cut-Extrude20 (cut, symmetric)
    with BuildSketch(Plane(origin=(63.5, 0, 0), x_dir=(0, 0, -1), z_dir=(1, 0, 0))):
        with Locations((0, 181.61)):
            Rectangle(SKETCH39_W, SKETCH39_H)
    extrude(amount=CUT_EXTRUDE20_DEPTH, both=True, mode=Mode.SUBTRACT)

    # Sketch41 → Cut-Extrude21 (cut, symmetric)
    with BuildSketch(Plane(origin=(0, 0, -45.72), x_dir=(-1, 0, 0), z_dir=(0, 0, -1))):
        with Locations((-1.5875, 181.61)):
            Rectangle(SKETCH41_W, SKETCH41_H)
    extrude(amount=CUT_EXTRUDE21_DEPTH, both=True, mode=Mode.SUBTRACT)

    # Sketch42 → Cut-Extrude22 (cut)
    with BuildSketch(Plane(origin=(0, 0, 0), x_dir=(1, 0, 0), z_dir=(0, 1, 0))):
        with Locations((0, 48.26)):
            Rectangle(SKETCH42_W, SKETCH42_H)
    extrude(amount=CUT_EXTRUDE22_DEPTH, mode=Mode.SUBTRACT)


solid = part.part
